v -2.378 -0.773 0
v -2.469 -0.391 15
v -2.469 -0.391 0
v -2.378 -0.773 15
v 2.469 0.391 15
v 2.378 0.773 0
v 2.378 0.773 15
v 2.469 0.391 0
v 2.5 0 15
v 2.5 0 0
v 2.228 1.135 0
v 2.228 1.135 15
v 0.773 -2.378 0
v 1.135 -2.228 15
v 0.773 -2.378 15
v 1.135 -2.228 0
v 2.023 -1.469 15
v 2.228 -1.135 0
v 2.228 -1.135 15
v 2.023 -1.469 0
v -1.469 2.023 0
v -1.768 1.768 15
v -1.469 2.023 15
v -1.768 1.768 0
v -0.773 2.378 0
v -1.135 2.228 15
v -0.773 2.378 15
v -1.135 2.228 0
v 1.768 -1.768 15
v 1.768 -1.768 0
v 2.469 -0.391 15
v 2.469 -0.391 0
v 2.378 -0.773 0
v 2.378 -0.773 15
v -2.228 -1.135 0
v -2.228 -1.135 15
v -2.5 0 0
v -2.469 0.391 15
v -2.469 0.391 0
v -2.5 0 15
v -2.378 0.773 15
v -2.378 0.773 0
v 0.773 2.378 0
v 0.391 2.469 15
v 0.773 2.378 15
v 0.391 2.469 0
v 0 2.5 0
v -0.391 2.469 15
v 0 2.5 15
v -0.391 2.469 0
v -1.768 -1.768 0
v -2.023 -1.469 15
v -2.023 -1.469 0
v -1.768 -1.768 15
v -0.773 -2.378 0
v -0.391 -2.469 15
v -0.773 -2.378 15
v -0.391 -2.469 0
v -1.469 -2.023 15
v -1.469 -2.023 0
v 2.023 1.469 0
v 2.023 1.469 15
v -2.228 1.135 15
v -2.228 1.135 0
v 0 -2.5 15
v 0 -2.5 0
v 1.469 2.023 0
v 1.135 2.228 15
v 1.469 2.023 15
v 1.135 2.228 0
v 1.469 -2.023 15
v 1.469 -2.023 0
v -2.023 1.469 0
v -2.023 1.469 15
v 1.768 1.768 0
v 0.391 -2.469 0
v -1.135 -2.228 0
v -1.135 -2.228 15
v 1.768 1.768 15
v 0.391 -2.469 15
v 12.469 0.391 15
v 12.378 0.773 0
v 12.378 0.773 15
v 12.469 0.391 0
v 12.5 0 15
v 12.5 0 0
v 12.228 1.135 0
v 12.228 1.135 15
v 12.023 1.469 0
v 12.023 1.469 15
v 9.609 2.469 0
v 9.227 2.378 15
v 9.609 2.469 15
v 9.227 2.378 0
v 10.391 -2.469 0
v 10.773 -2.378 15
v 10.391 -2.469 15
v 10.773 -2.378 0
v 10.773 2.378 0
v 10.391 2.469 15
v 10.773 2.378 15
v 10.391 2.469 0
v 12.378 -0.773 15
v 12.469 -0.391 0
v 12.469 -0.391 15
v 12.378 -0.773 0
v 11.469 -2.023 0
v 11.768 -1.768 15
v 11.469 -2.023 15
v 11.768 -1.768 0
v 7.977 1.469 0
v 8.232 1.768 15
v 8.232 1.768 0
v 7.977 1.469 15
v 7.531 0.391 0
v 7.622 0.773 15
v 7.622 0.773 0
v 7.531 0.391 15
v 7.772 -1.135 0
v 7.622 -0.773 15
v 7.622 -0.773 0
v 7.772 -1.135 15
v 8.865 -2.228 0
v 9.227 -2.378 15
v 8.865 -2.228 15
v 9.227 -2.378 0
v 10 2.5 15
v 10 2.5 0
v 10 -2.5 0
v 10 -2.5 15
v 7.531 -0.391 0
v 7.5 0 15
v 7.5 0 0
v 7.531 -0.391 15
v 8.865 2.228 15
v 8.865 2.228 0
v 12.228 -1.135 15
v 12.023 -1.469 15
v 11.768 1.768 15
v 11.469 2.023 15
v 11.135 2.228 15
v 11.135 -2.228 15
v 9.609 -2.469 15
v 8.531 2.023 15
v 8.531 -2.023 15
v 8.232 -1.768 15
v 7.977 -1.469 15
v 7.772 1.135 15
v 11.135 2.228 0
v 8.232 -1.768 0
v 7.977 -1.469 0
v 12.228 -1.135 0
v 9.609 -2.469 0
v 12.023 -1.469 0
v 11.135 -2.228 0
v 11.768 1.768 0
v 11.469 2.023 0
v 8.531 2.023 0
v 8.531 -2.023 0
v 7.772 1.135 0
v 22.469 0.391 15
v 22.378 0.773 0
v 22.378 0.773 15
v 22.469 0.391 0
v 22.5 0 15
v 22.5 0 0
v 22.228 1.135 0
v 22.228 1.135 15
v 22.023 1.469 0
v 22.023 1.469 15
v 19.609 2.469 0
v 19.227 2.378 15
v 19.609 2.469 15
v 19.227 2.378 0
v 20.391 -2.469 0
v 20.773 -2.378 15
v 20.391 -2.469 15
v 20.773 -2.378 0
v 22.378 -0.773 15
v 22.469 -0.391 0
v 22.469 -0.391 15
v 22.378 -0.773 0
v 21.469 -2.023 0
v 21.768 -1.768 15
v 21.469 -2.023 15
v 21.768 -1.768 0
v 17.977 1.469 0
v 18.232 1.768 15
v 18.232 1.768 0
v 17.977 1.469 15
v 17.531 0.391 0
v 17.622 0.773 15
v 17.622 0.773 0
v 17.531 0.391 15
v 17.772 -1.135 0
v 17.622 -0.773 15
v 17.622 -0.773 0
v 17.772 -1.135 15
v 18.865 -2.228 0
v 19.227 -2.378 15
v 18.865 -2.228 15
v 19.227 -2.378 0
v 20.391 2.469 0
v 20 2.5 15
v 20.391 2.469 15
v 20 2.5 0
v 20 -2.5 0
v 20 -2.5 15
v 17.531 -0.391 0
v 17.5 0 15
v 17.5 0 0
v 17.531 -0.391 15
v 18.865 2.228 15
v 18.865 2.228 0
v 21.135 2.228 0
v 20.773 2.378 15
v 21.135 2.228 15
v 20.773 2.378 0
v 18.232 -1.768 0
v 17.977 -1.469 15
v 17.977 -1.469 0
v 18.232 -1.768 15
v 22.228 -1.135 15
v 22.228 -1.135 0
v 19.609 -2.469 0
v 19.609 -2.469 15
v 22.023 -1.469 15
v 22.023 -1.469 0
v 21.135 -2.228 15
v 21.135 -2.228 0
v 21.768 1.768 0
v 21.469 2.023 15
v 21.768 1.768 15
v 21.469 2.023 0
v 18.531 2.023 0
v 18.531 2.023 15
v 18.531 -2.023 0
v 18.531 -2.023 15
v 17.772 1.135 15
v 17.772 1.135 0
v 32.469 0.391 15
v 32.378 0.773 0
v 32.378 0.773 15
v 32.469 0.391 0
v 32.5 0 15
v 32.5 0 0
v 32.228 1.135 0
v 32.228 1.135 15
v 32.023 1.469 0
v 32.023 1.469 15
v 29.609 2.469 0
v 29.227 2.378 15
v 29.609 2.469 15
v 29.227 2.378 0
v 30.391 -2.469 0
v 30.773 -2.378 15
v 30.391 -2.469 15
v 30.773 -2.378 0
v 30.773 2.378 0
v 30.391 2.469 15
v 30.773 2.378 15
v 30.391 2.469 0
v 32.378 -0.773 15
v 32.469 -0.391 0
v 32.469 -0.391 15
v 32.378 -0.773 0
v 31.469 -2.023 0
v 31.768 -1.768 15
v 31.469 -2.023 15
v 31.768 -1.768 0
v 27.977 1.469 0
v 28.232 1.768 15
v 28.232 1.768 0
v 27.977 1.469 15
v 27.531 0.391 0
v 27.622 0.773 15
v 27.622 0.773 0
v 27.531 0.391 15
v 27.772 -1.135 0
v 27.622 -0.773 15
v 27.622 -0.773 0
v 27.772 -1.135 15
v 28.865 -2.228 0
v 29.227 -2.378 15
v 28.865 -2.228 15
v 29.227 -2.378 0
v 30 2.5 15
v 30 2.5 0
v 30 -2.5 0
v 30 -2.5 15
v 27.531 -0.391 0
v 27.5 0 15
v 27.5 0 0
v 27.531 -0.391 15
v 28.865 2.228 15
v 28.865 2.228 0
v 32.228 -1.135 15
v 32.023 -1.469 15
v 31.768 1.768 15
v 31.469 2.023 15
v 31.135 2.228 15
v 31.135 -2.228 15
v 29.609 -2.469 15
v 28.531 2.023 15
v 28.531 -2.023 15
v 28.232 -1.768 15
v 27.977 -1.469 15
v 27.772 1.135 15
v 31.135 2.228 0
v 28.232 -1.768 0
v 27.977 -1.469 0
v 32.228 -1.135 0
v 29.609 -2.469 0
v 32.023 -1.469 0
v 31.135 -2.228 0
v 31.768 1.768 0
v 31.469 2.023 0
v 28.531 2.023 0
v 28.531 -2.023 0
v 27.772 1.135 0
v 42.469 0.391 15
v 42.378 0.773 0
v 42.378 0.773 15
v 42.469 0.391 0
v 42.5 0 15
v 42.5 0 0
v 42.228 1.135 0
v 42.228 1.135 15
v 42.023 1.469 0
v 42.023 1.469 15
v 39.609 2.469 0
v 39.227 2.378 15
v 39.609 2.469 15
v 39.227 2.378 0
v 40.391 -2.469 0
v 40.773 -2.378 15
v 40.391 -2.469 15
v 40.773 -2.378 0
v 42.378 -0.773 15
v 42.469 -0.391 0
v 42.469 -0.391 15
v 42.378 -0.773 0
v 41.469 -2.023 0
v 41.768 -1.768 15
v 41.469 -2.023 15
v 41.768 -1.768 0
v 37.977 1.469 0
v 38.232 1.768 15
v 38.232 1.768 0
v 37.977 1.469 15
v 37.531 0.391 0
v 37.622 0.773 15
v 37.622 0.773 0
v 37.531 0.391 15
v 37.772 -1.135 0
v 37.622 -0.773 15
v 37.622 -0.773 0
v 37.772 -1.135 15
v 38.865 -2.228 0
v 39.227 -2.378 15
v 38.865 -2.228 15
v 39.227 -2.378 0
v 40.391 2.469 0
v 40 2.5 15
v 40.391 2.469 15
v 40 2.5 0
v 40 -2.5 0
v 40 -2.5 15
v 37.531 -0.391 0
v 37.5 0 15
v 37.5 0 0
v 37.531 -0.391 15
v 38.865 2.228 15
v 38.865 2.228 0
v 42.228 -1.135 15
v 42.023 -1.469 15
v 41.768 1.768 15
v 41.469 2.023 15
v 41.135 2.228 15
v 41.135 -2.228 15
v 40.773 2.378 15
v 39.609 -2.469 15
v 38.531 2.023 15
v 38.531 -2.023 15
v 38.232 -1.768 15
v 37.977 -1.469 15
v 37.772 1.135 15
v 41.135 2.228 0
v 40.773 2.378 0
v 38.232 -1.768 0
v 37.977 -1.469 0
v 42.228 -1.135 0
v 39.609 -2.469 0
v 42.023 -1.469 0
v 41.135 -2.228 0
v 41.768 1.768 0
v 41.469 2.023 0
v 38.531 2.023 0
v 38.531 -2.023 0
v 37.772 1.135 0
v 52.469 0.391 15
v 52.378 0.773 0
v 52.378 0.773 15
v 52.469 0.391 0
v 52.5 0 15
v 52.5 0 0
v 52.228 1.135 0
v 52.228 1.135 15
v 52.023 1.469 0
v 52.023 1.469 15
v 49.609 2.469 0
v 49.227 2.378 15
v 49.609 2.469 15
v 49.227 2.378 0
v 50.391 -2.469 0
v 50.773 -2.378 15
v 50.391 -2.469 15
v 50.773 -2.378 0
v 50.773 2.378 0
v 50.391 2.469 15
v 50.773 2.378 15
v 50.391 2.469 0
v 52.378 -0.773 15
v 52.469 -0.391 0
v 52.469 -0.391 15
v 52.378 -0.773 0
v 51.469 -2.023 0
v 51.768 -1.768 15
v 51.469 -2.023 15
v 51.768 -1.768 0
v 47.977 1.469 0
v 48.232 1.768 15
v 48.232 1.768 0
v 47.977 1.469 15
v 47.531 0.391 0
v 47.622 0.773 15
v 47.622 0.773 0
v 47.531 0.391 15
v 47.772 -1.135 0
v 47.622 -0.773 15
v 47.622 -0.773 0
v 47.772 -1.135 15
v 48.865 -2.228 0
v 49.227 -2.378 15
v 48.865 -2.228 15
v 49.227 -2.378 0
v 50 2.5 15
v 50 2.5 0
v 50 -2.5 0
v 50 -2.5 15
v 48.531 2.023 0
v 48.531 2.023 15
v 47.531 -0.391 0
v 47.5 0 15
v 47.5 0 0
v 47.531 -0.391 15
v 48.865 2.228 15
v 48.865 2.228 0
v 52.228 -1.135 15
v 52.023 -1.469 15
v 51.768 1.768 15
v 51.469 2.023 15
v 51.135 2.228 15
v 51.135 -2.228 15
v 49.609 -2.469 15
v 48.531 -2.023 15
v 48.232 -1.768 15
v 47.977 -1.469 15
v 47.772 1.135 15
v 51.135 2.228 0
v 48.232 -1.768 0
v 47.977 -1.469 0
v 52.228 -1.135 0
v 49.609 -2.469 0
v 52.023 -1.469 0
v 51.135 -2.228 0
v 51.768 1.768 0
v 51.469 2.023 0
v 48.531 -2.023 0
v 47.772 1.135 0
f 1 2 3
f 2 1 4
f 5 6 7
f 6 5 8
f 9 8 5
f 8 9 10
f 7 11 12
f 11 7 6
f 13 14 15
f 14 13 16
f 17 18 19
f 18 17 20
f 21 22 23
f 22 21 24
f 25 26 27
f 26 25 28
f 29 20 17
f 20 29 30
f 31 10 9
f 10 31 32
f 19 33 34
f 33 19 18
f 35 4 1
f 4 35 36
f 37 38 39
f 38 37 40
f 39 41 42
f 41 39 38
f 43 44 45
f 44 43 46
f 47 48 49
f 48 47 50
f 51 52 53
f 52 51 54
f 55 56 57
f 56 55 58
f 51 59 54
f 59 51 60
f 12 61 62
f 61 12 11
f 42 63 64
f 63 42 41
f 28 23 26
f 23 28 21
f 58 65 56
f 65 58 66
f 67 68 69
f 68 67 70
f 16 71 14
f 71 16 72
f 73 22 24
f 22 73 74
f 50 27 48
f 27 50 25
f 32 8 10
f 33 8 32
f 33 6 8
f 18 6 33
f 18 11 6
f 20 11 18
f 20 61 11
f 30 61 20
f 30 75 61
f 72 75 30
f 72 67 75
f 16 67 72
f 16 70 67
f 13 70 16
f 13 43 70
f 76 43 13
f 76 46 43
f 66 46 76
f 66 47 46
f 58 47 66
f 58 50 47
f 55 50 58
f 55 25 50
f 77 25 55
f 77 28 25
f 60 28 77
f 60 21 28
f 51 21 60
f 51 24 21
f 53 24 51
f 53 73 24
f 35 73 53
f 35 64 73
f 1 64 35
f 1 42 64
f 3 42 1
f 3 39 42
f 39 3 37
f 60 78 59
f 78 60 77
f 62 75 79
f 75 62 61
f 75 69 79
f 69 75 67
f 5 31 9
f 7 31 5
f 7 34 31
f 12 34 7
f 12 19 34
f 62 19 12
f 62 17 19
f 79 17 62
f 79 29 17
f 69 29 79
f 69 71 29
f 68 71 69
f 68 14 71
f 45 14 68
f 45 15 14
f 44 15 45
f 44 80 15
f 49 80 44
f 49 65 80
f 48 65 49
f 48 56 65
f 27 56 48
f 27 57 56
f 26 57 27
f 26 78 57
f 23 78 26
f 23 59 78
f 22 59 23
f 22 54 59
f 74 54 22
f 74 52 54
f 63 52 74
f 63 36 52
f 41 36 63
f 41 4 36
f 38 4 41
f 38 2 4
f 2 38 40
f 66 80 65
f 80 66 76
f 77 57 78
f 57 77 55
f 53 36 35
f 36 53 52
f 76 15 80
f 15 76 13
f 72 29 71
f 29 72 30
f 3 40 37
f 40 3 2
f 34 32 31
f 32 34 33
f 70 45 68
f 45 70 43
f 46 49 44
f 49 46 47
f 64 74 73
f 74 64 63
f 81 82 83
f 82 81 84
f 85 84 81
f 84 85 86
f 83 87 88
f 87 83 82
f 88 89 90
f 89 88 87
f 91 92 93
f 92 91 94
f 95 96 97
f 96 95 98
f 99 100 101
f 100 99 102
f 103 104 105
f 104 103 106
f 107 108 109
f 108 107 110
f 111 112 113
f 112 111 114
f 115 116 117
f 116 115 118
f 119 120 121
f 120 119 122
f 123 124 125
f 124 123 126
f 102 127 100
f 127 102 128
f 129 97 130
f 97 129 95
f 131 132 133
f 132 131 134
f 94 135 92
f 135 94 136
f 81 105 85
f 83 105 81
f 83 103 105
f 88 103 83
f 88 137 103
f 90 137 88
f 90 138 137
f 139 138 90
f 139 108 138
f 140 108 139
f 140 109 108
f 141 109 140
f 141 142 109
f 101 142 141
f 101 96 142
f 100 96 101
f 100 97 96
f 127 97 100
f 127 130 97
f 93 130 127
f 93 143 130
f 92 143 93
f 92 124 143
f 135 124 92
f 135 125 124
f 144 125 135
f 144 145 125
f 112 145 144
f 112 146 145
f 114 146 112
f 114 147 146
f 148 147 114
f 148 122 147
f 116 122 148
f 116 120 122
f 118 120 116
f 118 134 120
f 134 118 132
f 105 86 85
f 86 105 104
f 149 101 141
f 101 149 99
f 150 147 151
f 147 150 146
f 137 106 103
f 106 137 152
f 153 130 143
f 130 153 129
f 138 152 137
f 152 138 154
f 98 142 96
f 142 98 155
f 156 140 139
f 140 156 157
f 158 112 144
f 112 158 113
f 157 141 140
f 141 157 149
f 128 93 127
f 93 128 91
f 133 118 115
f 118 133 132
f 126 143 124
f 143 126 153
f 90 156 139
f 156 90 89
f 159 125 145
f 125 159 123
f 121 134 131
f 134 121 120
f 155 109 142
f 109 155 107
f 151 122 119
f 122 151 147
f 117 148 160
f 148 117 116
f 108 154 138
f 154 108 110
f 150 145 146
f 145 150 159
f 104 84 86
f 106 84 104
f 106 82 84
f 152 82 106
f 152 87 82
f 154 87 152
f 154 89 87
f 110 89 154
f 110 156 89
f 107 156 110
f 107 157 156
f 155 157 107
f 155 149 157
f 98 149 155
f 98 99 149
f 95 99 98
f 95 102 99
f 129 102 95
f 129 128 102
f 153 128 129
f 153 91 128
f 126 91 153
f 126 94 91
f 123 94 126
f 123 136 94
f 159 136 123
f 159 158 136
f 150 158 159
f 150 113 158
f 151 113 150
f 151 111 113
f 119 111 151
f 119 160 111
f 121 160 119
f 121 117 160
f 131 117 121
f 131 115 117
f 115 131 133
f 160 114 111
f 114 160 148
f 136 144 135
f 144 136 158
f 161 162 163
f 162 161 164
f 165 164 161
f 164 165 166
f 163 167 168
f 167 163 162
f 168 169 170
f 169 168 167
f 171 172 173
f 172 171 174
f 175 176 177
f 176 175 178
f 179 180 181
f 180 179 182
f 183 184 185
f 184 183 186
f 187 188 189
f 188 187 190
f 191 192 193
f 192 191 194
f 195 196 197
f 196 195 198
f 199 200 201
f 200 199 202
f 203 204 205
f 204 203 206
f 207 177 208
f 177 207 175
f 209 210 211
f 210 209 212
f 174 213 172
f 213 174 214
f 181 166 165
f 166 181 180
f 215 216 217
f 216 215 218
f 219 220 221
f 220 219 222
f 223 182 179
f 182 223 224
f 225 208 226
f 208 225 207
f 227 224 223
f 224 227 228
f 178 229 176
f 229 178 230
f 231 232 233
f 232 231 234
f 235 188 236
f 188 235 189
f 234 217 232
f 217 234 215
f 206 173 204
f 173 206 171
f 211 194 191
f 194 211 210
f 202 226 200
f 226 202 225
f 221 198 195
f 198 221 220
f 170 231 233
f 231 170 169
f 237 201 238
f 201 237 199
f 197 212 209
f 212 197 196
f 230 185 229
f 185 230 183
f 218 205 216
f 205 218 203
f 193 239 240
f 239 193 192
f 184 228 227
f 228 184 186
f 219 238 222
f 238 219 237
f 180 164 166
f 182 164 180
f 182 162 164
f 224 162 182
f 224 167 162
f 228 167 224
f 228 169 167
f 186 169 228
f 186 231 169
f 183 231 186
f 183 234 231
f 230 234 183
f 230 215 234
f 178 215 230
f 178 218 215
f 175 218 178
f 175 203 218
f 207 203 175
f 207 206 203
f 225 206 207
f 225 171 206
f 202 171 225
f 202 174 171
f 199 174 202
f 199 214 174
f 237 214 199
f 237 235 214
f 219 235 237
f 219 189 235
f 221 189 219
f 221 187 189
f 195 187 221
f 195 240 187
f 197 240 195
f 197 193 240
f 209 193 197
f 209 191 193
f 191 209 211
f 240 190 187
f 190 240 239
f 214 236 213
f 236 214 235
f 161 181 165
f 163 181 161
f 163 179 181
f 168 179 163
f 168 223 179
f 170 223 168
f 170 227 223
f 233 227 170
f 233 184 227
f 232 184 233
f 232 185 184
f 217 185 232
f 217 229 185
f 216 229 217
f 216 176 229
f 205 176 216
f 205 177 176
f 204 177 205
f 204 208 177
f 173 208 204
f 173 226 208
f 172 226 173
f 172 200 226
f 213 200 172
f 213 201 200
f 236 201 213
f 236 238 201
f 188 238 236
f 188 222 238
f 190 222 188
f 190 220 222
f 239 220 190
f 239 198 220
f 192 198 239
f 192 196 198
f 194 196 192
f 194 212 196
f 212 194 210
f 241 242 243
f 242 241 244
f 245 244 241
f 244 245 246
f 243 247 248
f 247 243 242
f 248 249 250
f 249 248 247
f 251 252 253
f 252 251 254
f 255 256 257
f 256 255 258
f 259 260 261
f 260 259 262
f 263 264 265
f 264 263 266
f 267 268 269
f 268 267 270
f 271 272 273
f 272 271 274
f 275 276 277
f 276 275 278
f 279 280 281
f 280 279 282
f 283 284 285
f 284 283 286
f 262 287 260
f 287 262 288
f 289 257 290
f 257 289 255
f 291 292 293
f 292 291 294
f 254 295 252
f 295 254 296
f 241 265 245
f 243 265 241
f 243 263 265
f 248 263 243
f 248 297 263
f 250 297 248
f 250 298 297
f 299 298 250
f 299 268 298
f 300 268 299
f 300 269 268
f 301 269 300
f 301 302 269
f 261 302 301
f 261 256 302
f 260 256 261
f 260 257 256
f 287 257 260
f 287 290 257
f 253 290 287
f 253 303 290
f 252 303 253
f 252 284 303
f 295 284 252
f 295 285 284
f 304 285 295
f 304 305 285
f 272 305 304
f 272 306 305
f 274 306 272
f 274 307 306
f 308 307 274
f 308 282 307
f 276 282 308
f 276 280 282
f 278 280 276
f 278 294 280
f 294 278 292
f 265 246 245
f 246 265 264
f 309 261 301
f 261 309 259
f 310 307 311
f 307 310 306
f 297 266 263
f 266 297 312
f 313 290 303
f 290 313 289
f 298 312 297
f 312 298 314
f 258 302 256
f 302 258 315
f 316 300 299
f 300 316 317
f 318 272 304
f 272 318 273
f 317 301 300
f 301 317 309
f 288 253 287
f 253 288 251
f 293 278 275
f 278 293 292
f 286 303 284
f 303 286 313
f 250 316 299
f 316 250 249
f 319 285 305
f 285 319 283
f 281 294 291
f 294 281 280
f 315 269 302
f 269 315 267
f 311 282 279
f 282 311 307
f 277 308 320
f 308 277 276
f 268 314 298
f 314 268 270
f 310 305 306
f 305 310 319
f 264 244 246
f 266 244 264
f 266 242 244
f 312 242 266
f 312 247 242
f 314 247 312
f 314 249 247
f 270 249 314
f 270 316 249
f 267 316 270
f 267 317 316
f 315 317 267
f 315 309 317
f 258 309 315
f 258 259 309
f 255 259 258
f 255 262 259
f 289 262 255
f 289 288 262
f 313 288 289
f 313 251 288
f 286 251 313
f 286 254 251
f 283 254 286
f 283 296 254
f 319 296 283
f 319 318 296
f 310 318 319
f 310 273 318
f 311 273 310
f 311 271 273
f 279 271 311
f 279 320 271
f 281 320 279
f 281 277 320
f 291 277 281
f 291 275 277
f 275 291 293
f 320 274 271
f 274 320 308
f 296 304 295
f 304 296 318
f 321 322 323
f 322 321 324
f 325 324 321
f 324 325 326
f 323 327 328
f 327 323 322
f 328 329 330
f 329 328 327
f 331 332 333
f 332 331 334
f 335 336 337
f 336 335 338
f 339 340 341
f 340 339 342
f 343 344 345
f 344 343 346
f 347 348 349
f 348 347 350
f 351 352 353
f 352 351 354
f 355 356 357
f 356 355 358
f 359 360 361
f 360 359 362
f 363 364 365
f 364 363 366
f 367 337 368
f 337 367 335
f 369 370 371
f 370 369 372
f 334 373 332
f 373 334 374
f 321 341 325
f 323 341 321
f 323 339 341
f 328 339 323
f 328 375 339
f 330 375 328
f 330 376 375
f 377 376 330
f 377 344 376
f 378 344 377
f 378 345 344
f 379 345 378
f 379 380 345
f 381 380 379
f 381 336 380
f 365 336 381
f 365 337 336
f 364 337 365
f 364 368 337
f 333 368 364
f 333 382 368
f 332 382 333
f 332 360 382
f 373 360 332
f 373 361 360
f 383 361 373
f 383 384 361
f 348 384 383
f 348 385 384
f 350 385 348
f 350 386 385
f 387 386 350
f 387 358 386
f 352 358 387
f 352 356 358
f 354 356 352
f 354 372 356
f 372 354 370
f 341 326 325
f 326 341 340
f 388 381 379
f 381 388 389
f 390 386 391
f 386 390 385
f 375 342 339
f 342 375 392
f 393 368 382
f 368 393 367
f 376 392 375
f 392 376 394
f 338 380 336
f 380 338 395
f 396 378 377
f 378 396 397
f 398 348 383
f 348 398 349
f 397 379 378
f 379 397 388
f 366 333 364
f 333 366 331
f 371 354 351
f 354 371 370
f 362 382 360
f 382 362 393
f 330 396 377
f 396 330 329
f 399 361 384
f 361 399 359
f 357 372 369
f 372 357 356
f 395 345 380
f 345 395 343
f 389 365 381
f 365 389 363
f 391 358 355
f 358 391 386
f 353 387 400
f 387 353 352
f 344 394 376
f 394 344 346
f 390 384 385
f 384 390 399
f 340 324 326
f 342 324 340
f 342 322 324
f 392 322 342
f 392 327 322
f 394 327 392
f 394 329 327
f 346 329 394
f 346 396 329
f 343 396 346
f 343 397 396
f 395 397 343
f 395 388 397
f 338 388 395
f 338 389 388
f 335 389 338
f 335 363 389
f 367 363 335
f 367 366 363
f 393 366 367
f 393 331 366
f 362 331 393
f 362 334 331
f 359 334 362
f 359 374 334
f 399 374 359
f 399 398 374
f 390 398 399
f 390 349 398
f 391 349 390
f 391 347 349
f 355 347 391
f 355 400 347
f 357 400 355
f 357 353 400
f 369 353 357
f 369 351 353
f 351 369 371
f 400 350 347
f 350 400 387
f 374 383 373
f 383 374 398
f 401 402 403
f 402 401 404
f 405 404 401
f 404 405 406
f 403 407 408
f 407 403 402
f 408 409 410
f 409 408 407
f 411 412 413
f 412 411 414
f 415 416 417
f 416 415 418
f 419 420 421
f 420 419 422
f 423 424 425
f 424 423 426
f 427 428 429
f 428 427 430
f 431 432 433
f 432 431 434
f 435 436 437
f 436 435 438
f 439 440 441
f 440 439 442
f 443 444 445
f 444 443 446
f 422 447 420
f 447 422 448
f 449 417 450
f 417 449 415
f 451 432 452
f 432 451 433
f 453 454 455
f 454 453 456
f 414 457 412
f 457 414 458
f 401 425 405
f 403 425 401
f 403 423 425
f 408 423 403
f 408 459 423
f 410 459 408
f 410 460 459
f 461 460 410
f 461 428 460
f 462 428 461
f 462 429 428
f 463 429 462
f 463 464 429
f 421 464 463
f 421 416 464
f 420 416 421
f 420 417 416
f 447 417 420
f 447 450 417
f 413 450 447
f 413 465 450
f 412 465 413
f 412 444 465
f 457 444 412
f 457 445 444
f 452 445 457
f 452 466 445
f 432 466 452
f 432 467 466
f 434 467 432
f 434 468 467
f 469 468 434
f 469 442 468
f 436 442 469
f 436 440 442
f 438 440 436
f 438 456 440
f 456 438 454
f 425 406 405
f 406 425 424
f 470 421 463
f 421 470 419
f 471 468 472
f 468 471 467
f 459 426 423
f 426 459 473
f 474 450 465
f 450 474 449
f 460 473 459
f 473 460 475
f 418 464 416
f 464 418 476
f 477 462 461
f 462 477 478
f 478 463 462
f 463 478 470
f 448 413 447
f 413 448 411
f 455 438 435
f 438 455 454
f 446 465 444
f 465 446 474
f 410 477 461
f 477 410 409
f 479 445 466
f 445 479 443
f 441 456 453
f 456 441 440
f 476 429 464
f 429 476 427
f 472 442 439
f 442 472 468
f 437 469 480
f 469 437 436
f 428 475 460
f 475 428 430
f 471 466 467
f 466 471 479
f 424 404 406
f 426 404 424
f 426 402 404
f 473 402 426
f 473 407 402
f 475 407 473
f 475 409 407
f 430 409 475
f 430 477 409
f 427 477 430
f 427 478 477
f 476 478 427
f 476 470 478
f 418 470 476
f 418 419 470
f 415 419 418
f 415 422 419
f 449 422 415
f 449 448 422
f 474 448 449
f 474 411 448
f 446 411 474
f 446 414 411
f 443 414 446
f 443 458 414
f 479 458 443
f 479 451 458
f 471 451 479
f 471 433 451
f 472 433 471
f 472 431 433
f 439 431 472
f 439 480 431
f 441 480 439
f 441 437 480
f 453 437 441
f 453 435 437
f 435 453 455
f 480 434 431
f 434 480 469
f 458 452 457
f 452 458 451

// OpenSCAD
// Vamos a ver como repetir figuras periódicamente utilizando un bucle FOR

d=5;        // Diametro del taladro.
h=15;       // Algura del taladro
n=6;         // Número de taladros
dist=10;    // Distancia entre taladros

for(i=[0:n-1]){
    translate([dist*i, 0, 0])
        cylinder(d=5, h=15, $fn=40);
}
